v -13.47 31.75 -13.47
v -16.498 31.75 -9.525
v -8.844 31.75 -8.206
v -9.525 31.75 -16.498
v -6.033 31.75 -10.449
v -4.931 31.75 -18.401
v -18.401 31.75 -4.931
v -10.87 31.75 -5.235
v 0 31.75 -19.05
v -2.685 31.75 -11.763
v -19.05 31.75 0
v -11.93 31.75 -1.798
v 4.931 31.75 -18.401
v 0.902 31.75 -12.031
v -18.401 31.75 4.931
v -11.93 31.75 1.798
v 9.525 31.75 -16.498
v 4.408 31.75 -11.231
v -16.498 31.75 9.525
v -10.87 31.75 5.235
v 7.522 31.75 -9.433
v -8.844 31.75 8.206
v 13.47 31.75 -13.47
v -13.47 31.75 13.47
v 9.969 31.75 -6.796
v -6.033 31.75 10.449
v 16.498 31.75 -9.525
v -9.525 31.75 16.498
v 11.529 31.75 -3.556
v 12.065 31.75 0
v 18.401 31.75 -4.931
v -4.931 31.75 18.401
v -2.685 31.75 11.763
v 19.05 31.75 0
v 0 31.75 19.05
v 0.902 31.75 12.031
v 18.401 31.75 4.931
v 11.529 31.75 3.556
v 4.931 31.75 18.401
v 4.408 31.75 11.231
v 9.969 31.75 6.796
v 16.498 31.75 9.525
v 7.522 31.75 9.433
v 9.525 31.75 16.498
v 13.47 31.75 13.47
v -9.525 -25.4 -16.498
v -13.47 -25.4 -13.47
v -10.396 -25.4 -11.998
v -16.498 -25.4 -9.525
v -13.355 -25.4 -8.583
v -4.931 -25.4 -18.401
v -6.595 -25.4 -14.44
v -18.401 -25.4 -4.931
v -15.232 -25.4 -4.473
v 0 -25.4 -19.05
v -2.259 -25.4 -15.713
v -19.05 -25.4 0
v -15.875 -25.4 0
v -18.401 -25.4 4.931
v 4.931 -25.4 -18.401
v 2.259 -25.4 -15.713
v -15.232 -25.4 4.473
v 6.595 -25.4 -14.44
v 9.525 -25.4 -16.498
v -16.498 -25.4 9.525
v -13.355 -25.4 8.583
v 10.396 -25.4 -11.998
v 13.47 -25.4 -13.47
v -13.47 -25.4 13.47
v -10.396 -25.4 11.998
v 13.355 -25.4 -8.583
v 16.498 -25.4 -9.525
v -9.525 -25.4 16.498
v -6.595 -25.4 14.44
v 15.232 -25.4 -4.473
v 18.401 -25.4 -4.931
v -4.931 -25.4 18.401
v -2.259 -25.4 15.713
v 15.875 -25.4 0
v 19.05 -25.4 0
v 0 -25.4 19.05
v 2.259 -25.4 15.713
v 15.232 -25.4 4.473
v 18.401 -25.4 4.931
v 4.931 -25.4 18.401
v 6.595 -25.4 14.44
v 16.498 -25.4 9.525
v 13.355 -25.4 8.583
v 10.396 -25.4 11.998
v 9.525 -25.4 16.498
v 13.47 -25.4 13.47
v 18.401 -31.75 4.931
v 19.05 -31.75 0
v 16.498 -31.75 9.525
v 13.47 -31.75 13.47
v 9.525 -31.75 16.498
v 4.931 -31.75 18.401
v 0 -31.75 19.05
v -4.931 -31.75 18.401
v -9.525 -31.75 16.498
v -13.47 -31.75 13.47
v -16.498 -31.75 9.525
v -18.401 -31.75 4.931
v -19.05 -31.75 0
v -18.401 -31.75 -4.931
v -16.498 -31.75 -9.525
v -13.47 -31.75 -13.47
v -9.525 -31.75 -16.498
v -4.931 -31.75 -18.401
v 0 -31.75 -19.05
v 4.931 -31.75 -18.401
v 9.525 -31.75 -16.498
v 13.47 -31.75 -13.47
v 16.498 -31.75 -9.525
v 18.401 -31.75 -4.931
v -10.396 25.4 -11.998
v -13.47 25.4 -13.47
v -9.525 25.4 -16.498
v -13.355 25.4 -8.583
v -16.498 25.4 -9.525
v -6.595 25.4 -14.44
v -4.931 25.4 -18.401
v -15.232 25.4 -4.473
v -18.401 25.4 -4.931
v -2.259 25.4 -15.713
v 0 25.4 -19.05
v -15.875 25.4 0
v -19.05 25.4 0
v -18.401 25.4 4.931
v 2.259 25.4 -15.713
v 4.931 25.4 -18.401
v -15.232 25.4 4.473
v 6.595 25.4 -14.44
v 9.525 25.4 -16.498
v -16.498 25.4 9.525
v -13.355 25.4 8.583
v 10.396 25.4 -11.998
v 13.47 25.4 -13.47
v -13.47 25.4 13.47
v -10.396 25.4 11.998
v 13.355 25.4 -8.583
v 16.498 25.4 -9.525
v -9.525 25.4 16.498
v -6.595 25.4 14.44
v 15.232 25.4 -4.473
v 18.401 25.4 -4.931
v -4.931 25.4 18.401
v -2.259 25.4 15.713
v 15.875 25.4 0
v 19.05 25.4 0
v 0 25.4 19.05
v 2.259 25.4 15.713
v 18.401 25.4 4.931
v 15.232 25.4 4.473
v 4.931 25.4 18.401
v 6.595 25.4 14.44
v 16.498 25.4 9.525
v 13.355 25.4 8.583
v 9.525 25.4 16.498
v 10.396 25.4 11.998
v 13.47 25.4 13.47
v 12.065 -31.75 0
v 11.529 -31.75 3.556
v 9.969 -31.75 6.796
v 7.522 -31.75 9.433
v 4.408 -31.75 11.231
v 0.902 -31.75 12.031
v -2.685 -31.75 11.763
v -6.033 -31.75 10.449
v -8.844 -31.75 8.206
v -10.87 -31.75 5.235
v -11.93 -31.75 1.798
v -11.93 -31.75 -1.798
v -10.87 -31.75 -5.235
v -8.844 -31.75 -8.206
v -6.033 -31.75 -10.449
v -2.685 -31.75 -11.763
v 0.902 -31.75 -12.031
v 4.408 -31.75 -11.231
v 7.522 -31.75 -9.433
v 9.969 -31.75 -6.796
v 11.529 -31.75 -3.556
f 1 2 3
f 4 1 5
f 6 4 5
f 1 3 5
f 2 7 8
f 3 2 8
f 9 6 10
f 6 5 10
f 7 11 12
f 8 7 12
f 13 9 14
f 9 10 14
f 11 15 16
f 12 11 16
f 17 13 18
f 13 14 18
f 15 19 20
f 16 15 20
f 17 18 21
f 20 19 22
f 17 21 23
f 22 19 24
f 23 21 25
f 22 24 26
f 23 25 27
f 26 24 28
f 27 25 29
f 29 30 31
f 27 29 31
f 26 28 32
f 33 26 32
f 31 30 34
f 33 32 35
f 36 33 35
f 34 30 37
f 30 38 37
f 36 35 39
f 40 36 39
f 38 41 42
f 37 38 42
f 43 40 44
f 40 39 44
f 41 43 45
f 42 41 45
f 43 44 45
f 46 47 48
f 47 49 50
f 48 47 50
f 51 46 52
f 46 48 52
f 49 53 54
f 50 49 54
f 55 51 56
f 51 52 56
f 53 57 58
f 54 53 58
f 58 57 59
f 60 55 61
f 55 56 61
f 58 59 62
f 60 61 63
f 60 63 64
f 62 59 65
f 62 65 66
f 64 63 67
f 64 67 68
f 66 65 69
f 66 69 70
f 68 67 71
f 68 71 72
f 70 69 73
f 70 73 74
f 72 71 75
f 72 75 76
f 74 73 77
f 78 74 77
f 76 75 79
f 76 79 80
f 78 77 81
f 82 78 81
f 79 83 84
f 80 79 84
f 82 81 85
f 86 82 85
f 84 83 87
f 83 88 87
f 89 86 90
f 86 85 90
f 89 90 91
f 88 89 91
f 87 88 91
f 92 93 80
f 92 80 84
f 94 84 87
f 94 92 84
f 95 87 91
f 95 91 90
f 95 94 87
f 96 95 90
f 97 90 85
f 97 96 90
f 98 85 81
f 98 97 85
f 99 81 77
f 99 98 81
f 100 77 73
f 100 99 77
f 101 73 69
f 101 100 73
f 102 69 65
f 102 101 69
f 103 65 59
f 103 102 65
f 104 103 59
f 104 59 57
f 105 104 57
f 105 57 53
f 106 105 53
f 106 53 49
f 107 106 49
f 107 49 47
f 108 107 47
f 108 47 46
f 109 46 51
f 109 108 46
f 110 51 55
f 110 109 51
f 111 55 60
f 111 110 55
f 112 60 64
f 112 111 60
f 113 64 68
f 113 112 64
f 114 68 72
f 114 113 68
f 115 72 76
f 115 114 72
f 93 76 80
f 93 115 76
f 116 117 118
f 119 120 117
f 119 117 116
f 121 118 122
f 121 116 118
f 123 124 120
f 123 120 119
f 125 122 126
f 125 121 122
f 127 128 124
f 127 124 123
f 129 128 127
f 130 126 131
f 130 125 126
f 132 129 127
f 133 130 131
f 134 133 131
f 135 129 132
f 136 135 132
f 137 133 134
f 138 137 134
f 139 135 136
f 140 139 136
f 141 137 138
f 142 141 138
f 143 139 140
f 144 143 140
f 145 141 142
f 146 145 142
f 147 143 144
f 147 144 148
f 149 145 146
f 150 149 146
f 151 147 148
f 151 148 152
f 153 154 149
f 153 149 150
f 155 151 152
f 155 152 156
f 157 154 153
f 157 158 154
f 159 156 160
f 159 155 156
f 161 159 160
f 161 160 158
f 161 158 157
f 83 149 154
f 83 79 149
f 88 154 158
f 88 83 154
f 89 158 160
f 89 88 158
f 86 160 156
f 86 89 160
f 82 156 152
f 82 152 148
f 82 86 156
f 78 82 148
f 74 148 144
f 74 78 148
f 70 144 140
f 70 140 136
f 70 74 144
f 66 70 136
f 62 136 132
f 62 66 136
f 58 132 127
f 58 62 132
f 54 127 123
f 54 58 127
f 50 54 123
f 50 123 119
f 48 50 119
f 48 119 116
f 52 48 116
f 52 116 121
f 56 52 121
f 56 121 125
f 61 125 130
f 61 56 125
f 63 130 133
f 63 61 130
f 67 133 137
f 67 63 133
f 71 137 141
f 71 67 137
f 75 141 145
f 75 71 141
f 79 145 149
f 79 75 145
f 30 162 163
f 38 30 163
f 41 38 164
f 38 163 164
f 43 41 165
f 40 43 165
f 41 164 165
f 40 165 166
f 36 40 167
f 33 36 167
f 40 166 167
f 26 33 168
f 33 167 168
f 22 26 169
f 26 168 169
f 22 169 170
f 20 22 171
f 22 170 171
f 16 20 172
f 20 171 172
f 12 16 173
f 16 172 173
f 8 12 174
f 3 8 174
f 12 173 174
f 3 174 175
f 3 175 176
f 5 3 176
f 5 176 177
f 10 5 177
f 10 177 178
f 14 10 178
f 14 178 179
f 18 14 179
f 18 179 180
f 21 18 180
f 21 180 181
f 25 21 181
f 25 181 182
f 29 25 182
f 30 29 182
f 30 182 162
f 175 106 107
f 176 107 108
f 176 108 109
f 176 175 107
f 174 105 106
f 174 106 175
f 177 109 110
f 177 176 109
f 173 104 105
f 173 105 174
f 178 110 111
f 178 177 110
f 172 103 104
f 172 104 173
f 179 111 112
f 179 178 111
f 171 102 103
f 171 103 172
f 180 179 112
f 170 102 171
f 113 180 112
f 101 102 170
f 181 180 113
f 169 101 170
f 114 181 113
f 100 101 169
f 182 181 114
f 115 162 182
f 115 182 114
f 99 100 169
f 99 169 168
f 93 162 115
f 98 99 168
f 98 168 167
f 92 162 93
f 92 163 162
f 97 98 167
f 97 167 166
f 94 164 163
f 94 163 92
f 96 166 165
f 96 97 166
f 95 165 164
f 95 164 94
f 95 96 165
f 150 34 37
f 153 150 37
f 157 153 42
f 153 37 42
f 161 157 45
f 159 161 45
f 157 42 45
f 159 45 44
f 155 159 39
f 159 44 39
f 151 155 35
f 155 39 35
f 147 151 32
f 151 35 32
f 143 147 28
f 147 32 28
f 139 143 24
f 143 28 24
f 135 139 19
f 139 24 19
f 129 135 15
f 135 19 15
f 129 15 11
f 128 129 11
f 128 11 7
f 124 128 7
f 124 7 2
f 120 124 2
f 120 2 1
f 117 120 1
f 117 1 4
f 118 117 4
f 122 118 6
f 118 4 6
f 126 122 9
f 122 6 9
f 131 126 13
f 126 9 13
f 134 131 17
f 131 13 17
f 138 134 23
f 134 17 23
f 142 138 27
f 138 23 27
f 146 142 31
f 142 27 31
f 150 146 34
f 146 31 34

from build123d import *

# Parameters (mm, degrees)
F0_R     = 15.875
F1_DEPTH = 31.75
F2_R     = 19.05
F2_R_2   = 15.875
F3_DEPTH = 6.35
F5_R     = 12.065
F6_DEPTH = 63.501


with BuildPart() as f1:
    # F0 (on Front) → F1 (new body, symmetric)
    with BuildSketch(Plane.XZ):
        Circle(F0_R)
    extrude(amount=F1_DEPTH, both=True)

    # F2 (on face) → F3 (join)
    with BuildSketch(Plane.XZ.offset(31.75)):
        Circle(F2_R)
        Circle(F2_R_2, mode=Mode.SUBTRACT)
    extrude(amount=-F3_DEPTH)

    # F4: F1 across plane


with BuildPart() as f1_1:
    add(f1.part)
    add(f1.part.mirror(Plane.XZ))

    # F5 (on face) → F6 (cut, through all)
    with BuildSketch(Plane.XZ.offset(31.75)):
        Circle(F5_R)
    extrude(amount=-F6_DEPTH, mode=Mode.SUBTRACT)


solid = f1_1.part
